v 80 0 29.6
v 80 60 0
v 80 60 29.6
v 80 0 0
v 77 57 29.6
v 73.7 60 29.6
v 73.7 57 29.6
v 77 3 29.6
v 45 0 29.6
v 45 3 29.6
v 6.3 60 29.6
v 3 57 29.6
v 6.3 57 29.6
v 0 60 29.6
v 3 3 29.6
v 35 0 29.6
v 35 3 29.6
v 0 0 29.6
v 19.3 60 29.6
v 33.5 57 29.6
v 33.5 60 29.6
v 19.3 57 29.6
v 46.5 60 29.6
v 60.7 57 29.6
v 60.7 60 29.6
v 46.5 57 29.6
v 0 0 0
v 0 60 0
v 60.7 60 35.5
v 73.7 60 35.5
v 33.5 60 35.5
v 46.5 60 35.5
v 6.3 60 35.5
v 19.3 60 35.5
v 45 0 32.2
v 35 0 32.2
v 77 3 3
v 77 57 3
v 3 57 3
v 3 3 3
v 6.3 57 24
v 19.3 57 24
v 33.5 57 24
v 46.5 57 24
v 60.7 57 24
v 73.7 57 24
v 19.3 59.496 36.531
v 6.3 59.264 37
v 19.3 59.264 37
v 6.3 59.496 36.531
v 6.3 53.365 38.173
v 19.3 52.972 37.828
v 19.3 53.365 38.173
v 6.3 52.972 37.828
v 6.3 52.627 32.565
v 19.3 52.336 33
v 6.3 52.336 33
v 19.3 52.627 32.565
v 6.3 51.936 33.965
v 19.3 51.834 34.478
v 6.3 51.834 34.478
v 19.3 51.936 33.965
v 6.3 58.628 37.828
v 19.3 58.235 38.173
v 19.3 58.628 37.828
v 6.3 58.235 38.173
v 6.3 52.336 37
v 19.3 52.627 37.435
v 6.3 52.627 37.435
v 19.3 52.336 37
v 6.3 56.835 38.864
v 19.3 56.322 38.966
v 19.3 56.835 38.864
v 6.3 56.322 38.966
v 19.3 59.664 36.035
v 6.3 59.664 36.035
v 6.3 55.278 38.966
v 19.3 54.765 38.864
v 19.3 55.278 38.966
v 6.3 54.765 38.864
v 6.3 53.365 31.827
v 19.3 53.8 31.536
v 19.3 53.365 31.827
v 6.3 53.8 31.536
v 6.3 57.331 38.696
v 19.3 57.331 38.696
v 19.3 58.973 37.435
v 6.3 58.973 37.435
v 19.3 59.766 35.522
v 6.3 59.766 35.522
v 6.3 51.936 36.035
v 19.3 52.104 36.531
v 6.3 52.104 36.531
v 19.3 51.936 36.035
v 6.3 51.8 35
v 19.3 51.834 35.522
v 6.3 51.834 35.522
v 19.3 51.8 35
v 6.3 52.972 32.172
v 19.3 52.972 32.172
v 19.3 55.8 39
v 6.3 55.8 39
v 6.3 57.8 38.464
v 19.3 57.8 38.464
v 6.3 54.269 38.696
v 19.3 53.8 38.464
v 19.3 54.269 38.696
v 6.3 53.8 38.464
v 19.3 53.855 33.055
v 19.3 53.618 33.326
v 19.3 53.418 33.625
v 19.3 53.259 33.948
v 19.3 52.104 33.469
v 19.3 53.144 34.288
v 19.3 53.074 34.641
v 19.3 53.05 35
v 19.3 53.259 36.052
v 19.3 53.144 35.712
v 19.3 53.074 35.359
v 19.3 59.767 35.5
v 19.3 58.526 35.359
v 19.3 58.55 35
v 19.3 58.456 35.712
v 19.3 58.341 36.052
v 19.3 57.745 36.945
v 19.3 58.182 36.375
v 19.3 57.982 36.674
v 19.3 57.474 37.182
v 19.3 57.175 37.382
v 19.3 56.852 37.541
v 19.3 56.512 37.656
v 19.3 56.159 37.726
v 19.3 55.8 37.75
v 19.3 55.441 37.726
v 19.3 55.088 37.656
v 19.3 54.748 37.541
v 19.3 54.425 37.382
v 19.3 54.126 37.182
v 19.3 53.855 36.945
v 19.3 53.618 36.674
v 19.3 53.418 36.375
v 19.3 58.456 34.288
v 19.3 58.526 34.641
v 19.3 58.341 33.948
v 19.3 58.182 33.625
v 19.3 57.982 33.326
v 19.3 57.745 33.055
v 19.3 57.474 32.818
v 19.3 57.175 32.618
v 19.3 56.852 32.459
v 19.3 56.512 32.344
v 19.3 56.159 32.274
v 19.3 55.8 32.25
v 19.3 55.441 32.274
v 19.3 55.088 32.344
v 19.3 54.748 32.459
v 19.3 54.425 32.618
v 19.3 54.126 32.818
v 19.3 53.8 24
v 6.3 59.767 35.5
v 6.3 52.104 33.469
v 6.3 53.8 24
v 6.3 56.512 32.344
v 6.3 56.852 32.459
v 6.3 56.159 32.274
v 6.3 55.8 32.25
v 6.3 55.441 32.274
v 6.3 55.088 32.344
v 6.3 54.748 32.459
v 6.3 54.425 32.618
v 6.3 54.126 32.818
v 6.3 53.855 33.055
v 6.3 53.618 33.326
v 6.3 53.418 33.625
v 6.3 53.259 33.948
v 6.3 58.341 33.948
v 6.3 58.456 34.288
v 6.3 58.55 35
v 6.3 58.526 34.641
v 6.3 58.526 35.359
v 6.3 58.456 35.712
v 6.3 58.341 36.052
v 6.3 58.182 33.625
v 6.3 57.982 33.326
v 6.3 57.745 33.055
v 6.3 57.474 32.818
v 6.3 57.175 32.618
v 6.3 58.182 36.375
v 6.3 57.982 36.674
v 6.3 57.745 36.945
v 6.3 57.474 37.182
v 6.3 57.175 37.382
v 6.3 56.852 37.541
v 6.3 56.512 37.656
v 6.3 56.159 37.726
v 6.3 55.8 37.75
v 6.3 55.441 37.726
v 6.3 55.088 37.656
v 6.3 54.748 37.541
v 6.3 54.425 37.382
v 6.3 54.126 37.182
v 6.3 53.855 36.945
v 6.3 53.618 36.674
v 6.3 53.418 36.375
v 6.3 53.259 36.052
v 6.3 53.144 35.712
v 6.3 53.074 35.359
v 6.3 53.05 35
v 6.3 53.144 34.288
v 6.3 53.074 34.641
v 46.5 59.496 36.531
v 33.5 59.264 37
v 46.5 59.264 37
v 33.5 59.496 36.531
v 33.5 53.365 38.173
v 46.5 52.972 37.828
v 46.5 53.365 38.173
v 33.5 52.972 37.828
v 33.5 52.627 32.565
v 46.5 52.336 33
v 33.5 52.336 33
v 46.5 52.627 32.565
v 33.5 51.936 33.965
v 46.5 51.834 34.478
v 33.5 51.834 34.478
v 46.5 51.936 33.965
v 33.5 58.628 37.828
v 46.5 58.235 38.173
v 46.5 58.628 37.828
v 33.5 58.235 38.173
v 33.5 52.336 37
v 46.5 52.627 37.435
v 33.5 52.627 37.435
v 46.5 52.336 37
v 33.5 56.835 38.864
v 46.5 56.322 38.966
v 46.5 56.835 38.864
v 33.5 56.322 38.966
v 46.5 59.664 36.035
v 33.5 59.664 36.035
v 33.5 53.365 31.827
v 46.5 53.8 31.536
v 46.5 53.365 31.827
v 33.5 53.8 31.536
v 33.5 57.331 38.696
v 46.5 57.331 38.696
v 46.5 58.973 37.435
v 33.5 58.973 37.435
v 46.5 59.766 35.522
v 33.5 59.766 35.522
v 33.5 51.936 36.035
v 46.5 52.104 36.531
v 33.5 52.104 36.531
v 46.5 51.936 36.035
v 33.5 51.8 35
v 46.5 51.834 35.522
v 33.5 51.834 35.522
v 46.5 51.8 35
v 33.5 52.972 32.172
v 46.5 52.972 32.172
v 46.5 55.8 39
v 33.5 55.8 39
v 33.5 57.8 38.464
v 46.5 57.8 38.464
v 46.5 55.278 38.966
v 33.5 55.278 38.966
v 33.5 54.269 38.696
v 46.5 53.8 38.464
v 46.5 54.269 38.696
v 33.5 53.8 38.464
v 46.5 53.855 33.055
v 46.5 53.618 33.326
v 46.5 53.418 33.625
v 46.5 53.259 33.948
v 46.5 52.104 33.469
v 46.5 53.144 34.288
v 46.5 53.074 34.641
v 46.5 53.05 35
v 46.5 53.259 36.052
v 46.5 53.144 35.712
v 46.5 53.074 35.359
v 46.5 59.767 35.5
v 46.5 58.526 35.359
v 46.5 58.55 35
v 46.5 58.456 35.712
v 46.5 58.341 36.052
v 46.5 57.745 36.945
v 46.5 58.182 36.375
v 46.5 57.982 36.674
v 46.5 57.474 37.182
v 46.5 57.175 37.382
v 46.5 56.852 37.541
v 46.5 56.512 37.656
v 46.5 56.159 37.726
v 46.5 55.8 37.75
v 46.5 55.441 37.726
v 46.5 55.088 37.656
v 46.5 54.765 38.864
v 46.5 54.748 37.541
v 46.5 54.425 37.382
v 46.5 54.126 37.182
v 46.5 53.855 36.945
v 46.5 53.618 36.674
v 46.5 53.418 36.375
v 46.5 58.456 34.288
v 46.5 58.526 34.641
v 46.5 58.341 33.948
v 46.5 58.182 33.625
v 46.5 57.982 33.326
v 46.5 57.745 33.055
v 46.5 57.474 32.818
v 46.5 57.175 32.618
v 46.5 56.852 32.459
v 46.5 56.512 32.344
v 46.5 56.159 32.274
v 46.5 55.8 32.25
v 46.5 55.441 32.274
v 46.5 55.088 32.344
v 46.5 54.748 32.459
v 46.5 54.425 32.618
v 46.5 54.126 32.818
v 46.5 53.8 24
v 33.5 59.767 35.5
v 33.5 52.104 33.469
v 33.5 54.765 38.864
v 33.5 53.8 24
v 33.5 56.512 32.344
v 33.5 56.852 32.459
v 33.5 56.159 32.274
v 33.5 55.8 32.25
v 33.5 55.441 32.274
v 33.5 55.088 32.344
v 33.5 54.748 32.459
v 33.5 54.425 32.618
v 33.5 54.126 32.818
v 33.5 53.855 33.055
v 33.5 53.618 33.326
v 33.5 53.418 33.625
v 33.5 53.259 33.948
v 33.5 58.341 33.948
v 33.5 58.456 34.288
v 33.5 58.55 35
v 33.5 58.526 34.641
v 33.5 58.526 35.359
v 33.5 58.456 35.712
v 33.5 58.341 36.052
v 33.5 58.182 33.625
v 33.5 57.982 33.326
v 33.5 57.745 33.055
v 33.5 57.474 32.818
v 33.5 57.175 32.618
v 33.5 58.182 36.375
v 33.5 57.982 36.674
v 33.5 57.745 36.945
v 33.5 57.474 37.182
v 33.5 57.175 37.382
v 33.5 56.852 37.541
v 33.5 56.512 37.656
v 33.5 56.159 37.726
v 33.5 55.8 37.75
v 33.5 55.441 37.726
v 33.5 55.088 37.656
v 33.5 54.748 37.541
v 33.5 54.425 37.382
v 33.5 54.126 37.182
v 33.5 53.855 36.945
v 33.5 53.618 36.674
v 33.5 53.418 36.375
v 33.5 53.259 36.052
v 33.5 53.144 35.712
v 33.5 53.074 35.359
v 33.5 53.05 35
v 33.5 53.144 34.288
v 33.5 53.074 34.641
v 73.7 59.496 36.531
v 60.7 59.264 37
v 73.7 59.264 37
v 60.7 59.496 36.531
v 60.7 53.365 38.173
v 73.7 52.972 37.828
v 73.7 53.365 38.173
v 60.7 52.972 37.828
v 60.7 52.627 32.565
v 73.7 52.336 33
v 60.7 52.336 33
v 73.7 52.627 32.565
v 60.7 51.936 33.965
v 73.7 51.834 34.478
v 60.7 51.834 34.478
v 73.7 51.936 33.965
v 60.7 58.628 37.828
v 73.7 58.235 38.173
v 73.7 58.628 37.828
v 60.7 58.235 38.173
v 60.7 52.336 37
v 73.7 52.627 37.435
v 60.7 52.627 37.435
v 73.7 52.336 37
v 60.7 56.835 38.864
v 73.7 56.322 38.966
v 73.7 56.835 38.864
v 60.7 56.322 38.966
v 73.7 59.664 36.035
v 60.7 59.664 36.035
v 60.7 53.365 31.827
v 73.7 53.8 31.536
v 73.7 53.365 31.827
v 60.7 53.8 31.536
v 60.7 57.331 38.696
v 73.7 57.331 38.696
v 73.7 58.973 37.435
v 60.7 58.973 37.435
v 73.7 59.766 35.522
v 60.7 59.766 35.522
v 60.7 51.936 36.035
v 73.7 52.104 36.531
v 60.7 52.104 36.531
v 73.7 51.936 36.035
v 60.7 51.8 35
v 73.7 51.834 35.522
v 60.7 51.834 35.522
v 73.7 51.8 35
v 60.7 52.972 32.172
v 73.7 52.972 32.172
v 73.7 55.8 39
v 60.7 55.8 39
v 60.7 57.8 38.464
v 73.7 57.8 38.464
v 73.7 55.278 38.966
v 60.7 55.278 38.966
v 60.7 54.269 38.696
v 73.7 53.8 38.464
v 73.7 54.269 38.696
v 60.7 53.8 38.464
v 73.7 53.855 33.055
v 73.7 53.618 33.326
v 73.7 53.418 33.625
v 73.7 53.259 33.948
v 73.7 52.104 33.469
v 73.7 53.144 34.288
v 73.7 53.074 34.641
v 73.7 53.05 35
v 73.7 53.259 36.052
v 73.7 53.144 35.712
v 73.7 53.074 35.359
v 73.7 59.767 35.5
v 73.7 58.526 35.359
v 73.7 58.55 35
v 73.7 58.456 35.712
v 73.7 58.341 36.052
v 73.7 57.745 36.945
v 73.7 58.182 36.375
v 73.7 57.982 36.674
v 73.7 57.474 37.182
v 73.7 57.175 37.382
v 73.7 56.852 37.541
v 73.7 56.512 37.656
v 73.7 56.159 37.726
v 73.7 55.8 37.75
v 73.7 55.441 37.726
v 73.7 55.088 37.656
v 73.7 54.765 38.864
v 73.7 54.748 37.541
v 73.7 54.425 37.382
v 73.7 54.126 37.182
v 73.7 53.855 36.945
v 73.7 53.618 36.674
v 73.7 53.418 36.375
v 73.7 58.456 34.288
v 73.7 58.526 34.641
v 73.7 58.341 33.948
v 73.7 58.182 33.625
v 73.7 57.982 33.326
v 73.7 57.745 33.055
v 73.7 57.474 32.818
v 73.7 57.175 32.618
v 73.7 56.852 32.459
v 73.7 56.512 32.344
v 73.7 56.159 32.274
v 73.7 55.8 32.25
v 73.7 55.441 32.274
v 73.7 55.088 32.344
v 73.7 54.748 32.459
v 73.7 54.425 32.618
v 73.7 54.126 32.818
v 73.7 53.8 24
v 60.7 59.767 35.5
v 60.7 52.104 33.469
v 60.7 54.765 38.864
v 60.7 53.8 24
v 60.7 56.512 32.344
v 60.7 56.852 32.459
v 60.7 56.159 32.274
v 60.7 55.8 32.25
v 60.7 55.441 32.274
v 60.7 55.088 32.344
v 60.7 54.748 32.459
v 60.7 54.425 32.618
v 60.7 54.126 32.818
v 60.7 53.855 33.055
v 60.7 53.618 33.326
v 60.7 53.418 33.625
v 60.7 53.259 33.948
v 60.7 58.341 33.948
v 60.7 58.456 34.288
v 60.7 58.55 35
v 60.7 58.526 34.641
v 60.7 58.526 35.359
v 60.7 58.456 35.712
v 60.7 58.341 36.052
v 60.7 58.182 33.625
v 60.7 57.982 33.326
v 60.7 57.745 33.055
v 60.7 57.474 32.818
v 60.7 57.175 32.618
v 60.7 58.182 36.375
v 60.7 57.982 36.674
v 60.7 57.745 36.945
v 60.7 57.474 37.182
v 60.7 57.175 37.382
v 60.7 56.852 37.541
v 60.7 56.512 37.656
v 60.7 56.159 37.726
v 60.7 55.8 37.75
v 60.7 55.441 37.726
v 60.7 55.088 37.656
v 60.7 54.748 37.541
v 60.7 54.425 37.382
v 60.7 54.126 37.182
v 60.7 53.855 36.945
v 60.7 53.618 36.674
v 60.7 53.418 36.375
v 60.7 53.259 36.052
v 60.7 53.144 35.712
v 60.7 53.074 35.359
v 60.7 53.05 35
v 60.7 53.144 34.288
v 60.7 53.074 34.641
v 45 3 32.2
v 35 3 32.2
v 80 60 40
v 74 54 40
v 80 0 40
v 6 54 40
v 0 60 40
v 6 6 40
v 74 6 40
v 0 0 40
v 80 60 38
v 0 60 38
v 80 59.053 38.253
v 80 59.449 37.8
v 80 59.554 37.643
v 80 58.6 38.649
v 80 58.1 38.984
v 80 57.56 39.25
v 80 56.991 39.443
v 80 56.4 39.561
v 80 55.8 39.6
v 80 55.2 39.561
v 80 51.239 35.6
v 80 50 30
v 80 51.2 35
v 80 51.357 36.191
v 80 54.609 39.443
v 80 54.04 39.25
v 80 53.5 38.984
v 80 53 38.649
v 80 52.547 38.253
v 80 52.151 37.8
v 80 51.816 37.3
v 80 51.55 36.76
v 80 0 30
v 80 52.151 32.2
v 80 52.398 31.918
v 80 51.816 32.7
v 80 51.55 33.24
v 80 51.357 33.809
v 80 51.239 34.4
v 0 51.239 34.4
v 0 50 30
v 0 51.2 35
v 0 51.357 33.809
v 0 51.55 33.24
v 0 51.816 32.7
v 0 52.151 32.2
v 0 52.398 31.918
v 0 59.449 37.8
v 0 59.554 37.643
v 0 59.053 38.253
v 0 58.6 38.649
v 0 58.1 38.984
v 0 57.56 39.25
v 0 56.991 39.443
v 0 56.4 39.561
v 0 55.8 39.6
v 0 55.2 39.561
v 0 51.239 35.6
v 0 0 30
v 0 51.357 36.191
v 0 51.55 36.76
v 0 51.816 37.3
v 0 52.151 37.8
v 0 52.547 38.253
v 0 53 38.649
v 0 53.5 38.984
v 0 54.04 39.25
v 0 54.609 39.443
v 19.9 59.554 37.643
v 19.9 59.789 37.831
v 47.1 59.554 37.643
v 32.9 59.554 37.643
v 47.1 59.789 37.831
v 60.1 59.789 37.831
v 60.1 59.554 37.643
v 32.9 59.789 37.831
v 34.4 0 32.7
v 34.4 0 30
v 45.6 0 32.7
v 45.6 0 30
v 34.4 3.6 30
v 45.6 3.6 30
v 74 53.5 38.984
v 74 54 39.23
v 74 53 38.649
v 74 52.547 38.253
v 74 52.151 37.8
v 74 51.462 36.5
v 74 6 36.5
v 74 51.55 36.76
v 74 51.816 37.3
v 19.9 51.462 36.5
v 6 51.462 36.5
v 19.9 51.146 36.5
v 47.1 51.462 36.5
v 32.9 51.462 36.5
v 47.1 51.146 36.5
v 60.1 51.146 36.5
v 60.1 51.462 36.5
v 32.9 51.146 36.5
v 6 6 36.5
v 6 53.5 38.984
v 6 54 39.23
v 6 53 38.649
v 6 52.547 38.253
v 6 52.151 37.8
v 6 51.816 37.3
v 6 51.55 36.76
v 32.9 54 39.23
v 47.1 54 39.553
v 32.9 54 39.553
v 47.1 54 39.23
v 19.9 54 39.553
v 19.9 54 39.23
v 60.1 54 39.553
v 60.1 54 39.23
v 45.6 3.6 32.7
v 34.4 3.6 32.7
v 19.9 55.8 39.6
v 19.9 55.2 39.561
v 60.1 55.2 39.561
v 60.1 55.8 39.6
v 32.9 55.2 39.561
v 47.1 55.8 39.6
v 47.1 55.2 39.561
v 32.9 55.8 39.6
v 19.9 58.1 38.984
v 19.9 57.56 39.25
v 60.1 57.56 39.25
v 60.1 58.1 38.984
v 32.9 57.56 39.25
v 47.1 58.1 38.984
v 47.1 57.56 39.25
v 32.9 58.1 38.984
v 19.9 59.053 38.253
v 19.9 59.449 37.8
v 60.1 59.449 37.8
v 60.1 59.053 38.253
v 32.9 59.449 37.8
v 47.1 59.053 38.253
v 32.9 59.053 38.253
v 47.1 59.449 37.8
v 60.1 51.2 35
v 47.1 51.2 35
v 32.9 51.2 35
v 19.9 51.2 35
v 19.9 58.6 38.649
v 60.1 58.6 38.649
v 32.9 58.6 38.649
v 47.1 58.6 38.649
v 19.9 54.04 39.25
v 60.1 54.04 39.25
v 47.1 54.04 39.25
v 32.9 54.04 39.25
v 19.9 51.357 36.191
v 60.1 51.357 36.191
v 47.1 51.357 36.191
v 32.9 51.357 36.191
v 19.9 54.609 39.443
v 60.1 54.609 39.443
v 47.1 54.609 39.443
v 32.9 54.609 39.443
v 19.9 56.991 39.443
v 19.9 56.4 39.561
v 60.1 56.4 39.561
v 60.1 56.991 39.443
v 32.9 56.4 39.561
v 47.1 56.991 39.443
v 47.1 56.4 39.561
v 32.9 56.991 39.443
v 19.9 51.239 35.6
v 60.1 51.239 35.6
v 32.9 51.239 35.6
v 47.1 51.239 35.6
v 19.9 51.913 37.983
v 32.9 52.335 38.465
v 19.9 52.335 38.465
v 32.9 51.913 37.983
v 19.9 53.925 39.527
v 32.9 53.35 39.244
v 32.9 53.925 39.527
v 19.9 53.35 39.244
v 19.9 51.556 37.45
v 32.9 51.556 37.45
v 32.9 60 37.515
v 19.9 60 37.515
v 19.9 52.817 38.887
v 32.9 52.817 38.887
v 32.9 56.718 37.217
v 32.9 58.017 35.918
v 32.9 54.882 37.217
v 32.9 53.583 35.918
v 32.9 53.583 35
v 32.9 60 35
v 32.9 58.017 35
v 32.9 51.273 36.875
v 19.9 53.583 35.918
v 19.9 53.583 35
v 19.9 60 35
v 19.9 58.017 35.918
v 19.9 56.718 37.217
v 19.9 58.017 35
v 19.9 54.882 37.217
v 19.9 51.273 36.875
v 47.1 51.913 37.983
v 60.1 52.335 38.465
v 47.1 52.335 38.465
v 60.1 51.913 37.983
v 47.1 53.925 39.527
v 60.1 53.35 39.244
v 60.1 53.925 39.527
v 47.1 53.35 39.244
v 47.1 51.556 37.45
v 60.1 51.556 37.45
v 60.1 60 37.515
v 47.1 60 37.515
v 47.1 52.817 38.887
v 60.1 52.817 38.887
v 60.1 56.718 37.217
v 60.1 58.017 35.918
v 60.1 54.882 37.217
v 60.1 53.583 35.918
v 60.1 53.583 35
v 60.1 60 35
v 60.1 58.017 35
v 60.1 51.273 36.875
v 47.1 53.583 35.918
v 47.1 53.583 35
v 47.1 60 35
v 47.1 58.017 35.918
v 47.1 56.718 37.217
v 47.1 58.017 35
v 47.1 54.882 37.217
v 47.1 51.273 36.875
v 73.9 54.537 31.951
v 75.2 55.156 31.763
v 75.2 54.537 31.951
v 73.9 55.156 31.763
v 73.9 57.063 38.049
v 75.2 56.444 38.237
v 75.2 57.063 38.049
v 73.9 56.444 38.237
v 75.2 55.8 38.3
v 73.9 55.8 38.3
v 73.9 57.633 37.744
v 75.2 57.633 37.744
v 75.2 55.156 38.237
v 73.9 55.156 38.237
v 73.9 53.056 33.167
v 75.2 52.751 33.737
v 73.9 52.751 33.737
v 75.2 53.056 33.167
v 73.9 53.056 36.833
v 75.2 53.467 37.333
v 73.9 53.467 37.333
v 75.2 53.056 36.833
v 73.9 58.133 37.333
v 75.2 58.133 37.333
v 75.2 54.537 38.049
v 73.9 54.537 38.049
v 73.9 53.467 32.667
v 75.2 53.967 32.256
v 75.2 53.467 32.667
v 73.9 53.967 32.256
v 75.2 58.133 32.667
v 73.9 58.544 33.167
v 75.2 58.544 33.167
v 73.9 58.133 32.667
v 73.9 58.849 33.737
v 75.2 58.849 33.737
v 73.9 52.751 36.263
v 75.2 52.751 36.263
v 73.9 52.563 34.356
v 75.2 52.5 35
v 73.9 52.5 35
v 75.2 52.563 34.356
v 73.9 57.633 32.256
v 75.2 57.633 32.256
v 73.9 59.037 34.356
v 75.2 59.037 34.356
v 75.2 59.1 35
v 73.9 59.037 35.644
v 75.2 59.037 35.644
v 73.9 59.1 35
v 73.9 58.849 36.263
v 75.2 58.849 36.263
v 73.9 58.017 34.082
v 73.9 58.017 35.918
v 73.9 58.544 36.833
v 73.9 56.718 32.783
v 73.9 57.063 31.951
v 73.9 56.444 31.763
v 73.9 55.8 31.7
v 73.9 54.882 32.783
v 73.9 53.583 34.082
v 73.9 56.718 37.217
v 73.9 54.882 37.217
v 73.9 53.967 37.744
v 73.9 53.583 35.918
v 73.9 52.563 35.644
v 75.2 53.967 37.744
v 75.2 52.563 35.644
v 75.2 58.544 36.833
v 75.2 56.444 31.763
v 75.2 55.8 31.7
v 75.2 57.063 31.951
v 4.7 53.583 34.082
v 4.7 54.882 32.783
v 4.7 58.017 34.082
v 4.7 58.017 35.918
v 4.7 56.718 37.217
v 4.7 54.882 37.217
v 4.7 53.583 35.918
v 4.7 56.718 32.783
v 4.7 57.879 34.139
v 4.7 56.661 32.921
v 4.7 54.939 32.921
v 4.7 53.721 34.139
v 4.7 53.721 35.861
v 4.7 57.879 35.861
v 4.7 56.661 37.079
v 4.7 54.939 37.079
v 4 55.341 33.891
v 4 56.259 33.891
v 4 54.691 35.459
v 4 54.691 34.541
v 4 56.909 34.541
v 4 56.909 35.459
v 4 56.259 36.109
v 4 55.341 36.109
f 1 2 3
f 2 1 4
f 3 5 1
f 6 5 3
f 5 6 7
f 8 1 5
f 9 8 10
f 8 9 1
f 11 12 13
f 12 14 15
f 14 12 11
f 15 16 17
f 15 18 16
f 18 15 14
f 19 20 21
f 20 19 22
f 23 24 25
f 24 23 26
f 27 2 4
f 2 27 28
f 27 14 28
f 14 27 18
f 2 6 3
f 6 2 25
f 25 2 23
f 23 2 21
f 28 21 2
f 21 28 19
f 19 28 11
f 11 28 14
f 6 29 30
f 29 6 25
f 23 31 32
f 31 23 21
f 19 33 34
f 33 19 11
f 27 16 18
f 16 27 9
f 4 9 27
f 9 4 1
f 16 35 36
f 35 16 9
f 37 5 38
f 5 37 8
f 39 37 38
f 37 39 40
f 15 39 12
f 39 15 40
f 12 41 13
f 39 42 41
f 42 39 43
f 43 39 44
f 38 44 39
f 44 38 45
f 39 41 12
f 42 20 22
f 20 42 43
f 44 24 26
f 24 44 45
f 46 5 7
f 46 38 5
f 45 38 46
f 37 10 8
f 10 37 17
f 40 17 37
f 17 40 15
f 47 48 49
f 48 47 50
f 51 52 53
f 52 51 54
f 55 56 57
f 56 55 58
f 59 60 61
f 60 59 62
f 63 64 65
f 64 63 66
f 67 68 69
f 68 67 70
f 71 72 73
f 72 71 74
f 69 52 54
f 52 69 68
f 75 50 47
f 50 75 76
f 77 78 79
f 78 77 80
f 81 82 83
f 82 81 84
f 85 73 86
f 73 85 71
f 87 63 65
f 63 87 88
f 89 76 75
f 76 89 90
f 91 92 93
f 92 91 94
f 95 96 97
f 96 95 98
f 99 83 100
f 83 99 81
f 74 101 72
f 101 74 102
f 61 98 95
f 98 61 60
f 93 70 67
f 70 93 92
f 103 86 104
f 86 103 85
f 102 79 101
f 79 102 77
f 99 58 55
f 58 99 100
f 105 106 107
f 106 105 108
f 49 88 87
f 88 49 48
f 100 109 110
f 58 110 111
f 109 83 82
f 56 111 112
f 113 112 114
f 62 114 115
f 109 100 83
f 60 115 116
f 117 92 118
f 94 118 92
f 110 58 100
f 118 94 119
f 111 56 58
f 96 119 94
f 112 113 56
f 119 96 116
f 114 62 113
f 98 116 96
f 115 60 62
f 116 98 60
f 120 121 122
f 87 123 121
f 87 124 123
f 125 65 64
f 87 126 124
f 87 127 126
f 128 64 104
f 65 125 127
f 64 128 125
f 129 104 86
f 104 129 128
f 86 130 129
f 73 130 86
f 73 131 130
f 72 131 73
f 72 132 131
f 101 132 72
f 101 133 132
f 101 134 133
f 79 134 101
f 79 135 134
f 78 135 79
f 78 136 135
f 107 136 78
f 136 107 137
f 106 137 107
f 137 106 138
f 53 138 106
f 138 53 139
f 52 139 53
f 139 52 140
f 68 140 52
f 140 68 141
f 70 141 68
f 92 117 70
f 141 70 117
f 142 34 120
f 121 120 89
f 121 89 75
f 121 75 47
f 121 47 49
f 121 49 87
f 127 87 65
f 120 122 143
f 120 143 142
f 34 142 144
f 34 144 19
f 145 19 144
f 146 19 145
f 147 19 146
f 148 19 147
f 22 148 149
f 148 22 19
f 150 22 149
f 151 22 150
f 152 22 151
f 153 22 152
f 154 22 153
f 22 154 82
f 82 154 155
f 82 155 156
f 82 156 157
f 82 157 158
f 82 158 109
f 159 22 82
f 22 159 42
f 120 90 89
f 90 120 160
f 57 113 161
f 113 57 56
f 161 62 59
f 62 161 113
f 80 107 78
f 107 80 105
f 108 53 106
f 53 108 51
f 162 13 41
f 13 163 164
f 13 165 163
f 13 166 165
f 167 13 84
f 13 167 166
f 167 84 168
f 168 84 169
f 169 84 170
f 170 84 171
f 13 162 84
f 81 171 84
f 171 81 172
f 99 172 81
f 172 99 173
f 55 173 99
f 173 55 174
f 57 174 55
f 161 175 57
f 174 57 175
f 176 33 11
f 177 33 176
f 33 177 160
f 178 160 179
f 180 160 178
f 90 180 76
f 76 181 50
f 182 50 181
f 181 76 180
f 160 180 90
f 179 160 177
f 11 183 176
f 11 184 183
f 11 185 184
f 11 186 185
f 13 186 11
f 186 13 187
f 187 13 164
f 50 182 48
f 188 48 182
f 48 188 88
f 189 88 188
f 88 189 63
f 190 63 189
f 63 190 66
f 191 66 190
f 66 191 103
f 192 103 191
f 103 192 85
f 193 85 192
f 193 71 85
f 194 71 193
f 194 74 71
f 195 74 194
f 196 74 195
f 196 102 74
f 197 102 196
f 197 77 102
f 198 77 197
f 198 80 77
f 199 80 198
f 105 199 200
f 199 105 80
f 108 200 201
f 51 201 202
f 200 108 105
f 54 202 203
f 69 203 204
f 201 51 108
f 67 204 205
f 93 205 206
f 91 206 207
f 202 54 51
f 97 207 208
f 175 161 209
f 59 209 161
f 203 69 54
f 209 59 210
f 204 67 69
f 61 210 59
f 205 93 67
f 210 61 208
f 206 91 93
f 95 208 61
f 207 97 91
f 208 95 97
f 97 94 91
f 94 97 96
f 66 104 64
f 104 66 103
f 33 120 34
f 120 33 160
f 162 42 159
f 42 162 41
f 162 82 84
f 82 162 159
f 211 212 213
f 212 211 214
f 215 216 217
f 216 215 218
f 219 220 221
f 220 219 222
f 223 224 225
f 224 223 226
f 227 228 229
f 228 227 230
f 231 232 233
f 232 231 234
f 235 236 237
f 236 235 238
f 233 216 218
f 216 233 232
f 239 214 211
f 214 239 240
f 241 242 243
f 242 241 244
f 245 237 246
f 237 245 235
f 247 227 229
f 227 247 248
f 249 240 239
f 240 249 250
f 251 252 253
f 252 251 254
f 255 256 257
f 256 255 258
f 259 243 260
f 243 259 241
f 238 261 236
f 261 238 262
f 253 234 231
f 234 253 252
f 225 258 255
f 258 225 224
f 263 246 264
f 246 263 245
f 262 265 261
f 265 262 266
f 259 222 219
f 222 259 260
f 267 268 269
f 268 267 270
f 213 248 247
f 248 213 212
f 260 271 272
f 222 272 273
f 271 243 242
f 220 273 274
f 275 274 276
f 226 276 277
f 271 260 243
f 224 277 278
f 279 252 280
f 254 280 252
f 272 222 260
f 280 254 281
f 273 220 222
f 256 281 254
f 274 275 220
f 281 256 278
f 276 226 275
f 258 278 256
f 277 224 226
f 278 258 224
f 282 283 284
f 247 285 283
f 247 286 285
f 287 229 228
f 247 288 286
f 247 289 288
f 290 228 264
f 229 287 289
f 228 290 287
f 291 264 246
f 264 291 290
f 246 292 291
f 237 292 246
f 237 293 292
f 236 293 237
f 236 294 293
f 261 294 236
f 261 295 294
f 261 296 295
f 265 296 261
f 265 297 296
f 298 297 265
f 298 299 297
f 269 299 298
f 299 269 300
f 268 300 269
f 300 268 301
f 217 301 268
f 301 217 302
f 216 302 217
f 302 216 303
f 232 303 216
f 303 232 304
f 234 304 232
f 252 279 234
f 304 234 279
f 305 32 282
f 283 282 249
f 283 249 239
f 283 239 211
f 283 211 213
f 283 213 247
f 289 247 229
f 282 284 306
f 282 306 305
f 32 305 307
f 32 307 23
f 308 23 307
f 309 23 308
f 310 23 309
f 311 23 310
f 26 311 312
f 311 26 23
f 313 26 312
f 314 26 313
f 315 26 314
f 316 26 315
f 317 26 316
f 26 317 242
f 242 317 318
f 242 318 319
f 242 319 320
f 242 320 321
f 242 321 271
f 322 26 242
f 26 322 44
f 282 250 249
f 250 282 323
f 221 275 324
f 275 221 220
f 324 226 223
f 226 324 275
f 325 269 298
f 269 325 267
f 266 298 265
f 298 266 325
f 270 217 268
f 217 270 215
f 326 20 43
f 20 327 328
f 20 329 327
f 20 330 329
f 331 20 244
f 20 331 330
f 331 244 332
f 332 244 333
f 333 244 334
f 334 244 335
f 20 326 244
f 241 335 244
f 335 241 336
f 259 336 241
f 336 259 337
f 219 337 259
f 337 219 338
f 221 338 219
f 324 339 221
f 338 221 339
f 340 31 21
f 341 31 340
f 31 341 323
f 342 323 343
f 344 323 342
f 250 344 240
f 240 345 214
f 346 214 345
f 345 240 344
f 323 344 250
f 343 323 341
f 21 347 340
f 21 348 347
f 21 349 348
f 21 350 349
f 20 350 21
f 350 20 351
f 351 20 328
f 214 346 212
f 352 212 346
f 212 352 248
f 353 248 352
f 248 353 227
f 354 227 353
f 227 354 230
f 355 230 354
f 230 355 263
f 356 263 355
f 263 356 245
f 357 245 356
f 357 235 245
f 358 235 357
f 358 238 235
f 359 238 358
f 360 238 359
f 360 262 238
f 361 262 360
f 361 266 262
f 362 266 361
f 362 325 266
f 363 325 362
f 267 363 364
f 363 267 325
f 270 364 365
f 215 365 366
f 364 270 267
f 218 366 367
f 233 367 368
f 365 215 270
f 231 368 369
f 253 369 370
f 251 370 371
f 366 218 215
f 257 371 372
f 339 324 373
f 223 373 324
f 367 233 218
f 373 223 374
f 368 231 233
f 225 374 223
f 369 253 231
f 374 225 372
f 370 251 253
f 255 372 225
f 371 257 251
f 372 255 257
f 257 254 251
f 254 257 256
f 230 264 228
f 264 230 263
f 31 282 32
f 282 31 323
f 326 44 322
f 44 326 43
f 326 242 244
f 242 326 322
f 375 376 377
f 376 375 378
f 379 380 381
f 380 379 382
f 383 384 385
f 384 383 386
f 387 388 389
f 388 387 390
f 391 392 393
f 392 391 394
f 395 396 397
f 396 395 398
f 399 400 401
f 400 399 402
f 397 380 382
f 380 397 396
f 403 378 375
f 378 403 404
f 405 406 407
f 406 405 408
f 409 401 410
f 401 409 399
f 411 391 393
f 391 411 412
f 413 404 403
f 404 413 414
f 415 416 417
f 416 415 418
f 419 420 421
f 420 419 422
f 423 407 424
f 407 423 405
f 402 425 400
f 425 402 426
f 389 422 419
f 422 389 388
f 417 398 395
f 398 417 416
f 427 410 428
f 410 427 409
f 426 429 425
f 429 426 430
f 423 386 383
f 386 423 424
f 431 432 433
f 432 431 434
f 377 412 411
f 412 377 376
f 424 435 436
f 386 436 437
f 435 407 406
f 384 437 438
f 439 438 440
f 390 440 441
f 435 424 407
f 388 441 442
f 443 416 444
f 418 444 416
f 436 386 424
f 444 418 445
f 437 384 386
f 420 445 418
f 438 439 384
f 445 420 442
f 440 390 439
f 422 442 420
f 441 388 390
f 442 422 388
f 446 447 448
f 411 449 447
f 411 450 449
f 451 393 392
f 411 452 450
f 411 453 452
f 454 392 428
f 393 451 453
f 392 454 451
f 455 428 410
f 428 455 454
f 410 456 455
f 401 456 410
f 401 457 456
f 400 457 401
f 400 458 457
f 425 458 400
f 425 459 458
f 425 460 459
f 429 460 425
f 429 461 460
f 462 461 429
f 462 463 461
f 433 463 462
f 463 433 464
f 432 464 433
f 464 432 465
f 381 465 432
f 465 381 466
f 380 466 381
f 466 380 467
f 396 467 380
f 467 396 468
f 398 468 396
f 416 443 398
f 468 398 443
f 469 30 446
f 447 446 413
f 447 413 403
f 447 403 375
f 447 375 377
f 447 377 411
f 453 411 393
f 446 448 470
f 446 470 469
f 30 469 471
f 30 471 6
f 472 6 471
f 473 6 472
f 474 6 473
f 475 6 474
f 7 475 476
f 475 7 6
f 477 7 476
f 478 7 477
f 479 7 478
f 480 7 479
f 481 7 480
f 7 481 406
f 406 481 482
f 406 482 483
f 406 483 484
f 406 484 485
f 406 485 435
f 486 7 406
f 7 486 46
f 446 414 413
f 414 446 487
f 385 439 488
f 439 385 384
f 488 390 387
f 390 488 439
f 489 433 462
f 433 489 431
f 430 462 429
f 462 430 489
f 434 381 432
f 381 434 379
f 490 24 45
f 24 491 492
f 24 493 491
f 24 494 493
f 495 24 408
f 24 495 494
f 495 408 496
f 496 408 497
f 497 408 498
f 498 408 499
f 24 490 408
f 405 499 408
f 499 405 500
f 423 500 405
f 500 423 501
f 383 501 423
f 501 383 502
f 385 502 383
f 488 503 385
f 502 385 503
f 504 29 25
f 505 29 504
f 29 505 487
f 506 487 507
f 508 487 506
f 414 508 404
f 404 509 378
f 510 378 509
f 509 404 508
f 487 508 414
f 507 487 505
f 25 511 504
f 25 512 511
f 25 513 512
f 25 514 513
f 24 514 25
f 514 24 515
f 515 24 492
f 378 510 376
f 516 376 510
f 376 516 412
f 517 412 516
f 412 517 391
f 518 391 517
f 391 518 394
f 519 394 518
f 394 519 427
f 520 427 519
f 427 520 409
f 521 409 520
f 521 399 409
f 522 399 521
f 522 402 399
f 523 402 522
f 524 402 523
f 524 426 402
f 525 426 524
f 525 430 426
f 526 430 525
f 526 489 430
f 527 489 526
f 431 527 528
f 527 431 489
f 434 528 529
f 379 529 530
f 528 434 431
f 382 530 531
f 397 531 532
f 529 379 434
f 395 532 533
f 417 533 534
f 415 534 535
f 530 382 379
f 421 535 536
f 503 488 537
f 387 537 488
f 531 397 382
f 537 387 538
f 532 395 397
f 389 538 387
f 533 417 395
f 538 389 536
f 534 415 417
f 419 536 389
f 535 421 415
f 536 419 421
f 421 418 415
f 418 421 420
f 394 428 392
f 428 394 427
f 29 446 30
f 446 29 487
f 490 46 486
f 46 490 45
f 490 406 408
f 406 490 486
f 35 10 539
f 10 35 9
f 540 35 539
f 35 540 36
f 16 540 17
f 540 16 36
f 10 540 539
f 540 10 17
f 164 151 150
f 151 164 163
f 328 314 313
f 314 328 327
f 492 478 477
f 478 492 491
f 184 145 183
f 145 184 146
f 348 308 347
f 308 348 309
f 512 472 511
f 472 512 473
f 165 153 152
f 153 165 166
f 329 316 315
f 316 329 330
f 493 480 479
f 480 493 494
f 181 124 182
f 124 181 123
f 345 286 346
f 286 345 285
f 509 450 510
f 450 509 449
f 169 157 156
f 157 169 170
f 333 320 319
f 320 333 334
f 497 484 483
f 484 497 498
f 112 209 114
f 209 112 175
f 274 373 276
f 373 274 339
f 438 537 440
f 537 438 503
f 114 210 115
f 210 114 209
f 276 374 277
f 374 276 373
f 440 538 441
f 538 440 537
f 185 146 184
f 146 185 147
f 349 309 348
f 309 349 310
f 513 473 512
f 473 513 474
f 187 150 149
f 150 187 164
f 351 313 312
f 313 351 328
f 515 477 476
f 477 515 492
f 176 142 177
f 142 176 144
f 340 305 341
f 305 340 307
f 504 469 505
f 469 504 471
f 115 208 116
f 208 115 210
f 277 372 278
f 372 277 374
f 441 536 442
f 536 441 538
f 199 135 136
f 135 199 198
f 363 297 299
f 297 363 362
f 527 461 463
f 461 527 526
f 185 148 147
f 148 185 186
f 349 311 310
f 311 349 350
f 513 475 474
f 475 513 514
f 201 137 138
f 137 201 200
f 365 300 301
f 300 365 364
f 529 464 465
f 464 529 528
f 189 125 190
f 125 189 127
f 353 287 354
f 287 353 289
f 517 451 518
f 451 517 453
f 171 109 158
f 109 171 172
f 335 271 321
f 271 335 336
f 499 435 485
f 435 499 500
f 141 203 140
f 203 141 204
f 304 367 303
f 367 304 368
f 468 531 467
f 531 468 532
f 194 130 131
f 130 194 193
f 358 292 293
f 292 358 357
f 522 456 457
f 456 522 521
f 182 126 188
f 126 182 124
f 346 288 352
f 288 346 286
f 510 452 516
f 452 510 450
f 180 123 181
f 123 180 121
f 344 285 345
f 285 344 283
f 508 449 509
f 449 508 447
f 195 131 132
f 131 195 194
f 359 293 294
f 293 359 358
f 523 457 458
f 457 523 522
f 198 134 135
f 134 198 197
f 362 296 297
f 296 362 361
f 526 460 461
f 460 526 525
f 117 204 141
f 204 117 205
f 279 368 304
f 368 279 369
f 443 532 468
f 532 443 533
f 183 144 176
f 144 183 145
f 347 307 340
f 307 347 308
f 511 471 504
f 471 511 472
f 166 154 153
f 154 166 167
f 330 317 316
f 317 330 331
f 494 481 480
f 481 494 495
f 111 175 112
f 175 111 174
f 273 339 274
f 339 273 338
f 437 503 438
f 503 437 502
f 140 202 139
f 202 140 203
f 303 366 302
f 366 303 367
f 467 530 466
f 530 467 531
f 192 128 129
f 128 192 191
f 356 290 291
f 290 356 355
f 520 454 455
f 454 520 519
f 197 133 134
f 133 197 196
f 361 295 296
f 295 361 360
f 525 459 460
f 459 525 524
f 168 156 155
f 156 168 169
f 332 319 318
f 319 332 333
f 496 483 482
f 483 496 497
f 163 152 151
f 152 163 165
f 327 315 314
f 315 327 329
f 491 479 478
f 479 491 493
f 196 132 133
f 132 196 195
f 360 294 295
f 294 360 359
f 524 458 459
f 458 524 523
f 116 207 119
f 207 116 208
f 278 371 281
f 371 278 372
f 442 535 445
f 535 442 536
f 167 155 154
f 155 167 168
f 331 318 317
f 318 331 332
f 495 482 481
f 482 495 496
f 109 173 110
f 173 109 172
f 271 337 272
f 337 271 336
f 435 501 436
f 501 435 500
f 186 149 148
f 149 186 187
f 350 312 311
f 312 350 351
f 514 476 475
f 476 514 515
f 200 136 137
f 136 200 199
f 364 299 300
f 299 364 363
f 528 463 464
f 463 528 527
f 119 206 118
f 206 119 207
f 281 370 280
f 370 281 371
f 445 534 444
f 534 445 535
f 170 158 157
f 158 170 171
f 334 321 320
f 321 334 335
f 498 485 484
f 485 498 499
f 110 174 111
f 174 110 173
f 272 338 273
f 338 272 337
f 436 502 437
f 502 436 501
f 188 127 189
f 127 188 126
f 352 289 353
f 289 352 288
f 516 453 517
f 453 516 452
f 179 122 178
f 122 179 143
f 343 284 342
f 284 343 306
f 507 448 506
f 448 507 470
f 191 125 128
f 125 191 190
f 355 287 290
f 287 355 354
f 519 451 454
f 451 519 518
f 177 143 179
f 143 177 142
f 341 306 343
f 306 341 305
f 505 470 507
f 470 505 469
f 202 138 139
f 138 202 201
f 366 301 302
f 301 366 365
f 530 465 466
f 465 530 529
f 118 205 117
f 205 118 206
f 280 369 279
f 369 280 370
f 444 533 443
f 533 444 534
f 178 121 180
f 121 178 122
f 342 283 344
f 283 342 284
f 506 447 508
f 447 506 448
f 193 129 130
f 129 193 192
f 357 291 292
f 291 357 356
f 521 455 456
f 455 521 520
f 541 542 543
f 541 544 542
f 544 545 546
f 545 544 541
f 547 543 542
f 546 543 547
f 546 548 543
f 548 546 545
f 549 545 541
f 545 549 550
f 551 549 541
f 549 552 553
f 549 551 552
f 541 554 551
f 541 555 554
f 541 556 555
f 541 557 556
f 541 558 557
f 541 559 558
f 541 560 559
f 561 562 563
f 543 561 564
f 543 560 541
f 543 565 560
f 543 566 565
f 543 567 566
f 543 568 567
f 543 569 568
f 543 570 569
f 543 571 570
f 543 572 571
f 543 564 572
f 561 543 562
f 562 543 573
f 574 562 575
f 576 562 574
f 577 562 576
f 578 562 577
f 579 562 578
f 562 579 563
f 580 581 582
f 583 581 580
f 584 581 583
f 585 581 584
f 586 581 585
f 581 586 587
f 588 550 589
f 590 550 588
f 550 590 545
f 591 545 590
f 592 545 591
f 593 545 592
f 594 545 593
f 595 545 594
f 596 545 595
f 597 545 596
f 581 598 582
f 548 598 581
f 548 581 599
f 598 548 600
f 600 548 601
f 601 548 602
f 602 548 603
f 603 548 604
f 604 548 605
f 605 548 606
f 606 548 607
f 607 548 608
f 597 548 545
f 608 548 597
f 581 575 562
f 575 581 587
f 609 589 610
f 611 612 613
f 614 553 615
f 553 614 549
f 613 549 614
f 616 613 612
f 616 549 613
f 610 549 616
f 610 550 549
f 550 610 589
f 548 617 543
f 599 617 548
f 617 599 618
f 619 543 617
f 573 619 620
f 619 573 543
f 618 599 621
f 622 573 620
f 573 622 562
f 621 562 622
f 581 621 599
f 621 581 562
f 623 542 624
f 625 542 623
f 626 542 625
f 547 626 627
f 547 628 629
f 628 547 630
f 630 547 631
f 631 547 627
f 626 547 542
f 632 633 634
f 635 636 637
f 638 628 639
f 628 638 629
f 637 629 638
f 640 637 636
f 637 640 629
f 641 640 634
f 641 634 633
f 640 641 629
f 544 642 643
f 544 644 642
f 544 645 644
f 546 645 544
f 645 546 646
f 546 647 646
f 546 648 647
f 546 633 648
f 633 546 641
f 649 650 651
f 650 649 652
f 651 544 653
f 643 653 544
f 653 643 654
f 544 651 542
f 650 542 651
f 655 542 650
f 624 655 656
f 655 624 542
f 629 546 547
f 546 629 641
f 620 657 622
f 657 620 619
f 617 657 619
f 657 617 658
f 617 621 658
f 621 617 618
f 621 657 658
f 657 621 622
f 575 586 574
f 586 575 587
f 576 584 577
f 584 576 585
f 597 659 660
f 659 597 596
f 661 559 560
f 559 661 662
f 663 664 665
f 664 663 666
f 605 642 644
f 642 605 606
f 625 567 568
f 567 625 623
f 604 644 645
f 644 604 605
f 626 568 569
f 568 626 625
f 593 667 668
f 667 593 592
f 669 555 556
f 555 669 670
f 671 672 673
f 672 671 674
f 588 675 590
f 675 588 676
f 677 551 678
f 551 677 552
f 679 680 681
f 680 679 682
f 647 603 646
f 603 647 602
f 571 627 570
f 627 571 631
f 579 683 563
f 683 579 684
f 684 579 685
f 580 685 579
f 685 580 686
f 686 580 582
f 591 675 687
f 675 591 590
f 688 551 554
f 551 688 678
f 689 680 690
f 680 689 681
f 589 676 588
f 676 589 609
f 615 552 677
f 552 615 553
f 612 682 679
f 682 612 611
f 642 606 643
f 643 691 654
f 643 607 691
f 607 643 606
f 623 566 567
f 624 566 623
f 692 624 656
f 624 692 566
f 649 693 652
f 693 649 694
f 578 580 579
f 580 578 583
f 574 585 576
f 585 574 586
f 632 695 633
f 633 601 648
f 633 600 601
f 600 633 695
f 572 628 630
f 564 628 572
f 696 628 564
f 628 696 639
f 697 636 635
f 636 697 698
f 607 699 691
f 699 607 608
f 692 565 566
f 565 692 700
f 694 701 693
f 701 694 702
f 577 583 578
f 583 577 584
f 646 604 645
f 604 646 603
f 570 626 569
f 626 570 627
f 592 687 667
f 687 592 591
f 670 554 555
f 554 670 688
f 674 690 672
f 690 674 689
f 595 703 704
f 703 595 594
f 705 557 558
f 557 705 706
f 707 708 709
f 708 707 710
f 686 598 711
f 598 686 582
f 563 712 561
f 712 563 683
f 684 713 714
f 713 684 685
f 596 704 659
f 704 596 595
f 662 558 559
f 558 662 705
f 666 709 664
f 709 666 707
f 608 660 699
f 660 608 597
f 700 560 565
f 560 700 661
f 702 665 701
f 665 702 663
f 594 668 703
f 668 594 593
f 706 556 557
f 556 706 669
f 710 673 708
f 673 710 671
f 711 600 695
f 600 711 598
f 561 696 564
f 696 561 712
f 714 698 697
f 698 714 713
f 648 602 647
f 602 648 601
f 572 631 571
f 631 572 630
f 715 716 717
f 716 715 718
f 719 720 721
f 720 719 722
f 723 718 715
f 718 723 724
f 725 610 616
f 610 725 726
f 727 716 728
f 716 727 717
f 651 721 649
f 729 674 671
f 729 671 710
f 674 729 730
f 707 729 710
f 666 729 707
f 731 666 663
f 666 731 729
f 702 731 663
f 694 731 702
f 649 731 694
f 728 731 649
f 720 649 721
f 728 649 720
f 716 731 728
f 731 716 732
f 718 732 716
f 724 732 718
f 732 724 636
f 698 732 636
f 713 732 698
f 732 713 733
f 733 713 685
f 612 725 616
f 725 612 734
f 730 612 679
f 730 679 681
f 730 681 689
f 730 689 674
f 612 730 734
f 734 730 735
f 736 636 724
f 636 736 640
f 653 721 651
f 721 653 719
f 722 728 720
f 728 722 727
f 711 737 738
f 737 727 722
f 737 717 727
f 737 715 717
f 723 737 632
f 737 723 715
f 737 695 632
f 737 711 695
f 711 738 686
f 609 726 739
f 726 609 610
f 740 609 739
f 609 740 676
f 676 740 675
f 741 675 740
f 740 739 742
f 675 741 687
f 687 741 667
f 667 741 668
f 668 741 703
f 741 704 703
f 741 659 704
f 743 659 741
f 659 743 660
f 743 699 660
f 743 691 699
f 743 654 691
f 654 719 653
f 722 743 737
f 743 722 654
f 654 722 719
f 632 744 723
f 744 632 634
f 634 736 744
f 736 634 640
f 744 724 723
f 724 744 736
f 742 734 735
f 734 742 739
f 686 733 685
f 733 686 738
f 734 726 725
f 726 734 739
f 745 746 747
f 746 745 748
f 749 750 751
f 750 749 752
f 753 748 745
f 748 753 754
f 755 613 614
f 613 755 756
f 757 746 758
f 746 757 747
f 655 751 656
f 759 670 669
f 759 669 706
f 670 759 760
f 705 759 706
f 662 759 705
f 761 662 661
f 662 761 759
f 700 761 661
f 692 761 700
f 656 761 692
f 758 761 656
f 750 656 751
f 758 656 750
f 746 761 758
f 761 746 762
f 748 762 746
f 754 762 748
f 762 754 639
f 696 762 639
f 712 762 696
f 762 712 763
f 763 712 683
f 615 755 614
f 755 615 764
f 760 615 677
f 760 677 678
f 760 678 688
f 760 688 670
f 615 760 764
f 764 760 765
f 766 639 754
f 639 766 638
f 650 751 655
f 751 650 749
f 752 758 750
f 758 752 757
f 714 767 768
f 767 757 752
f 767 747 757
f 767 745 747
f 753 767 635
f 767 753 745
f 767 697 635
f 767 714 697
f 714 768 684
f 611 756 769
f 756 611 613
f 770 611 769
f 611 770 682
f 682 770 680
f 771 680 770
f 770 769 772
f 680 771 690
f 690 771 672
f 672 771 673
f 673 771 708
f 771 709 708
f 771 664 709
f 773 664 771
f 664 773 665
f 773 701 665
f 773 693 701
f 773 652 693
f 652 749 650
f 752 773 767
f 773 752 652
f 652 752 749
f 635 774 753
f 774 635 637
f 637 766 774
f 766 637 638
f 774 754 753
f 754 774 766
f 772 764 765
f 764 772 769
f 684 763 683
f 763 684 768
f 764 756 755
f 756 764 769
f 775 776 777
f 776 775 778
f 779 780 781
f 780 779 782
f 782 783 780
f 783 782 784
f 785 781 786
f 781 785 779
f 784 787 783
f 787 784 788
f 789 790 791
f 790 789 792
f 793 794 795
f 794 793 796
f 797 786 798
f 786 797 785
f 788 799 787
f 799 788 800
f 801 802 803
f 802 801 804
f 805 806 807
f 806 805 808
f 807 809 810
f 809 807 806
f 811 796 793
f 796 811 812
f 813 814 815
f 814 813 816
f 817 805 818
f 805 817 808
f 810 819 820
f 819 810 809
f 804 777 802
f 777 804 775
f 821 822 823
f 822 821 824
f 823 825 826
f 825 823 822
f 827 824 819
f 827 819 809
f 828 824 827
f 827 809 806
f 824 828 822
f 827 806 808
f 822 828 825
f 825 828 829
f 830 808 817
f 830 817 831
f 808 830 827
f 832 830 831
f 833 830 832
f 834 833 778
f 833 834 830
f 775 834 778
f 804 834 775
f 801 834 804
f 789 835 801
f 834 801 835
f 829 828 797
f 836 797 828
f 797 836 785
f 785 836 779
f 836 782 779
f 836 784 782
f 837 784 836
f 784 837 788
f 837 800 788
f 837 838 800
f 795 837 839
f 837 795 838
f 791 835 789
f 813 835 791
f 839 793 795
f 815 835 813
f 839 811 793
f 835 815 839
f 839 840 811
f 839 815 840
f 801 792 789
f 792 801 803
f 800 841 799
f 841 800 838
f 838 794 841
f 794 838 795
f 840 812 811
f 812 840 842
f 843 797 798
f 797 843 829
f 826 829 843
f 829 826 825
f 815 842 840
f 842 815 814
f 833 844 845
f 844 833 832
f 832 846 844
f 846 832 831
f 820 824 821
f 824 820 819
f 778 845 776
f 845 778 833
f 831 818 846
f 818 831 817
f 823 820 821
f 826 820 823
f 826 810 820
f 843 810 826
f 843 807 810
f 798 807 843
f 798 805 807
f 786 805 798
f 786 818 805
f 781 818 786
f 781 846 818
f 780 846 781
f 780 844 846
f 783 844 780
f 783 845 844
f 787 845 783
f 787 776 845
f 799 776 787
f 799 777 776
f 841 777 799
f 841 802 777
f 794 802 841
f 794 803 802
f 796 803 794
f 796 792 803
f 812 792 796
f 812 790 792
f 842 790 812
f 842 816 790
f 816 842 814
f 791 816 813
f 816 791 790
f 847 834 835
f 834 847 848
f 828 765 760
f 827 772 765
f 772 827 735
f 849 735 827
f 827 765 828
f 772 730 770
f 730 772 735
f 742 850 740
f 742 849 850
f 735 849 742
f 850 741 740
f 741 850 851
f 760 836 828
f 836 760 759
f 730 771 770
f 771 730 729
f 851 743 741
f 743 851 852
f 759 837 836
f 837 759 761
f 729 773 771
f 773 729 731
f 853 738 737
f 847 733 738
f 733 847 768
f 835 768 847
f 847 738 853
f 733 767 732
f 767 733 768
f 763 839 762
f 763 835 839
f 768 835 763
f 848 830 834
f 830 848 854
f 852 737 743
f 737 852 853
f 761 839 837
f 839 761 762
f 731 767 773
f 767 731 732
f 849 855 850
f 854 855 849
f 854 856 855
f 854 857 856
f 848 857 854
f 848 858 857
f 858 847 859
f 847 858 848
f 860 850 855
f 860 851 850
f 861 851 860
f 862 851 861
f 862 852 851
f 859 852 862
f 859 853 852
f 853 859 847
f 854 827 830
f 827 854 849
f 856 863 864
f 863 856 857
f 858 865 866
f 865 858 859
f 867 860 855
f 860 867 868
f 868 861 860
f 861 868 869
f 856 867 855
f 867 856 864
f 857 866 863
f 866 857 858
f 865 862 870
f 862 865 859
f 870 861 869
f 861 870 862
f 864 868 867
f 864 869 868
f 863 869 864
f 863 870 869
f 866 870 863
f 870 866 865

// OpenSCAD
// Print-in-place hinged box, 80 x 60 x 40 mm closed.
// Printed closed in PLA (Bambu A1, 0.4 nozzle): base, lid and a captive
// hinge pin are separate bodies with 0.35-0.6 mm clearances, so the hinge
// breaks free by hand.  No supports: the lid underside bridges the cavity,
// the hinge barrels/pin use faceted (octagonal) lower surfaces, and all
// other downward faces are short bridges or rest on the body below.

/* [Part] */
part = "assembly"; // [assembly, box, lid, pin]

/* [Dimensions] */
box_w = 80;          // X, outside
box_d = 60;          // Y, outside (front y=0, back y=60)
box_h = 29.6;        // base height to its rim
lid_h = 10;          // lid height; lid bottom at z=30 (0.4 gap)
lid_z = 30;
wall = 3;
floor_t = 3;
total_h = 40;

hinge_y = 55.8;      // hinge axis, assembly coords
hinge_z = 35;
barrel_r = 4.0;
pin_r = 2.4;         // octagon circumradius
bore_r = 2.75;       // pin_r + 0.35 radial clearance
relief_r = 4.6;      // barrel_r + 0.6

// Alternating knuckles along the back edge (x intervals), 0.6 mm end gaps.
box_segs  = [[6.3, 19.3], [33.5, 46.5], [60.7, 73.7]];
lid_segs  = [[19.9, 32.9], [47.1, 60.1]];

cadverify_only = "";
module instance(name, part_name, unit = 1) {
    echo(cadverify_instance = [name, part_name, unit]);
    if (cadverify_only == "" || cadverify_only == name) children();
}

// ---------------------------------------------------------------- base (box)
module box_main() {
    difference() {
        union() {
            // shell: outer block minus open-top cavity
            difference() {
                cube([box_w, box_d, box_h]);
                translate([wall, wall, floor_t]) cube([box_w - 2 * wall, box_d - 2 * wall, box_h]);
            }
            // hinge knuckles (base) + support posts down to the back wall
            for (s = box_segs) {
                translate([s[0], hinge_y, hinge_z]) rotate([0, 90, 0])
                    cylinder(h = s[1] - s[0], r = barrel_r, $fn = 48);
                translate([s[0], 53.8, 24]) cube([s[1] - s[0], 6.2, 11.5]);
            }
            // front catch tooth (enters the socket in the lid)
            translate([35, 0, box_h]) cube([10, wall, 2.6]);
        }
        // pin bore through the base knuckles
        translate([-1, hinge_y, hinge_z]) rotate([0, 90, 0])
            cylinder(h = box_w + 2, r = bore_r, $fn = 48);
    }
}

// ---------------------------------------------------------------- lid (local: z 0..10, hinge axis at z=5)
module lid_main() {
    union() {
        difference() {
            union() {
                // main slab, side profile (Y-Z) extruded along X.
                // Rear lower edge chamfered 50,0 -> 60,8 so the slab
                // swings clear of the base back wall.
                rotate([0, 90, 0])
                    linear_extrude(height = box_w)
                        polygon(points = [[0, 0], [0, 50], [-8, 60], [-10, 60], [-10, 0]]);
                // hinge knuckles (lid)
                for (s = lid_segs)
                    translate([s[0], hinge_y, 5]) rotate([0, 90, 0])
                        cylinder(h = s[1] - s[0], r = barrel_r, $fn = 48);
            }
            // recessed panel in the top face
            translate([6, 6, 6.5]) cube([68, 48, 4]);
            // front catch socket (tooth: x35..45, z assy 29.6..32.2)
            translate([34.4, -1, -0.5]) cube([11.2, 4.6, 3.2]);
            // clearance tunnel for the base knuckles / pin
            translate([-1, hinge_y, 5]) rotate([0, 90, 0])
                cylinder(h = box_w + 2, r = relief_r, $fn = 48);
            // pin bore through the lid knuckles
            translate([-1, hinge_y, 5]) rotate([0, 90, 0])
                cylinder(h = box_w + 2, r = bore_r, $fn = 48);
        }
        // webs joining lid knuckles to the slab: upper half-discs r=4.9
        // (stay above z=30.1 in assembly, clear of the base rim at 29.6)
        for (s = lid_segs)
            intersection() {
                translate([s[0], hinge_y, 5]) rotate([0, 90, 0])
                    cylinder(h = s[1] - s[0], r = 4.9, $fn = 48);
                translate([s[0], hinge_y - 10, 5]) cube([s[1] - s[0], 20, 5]);
                translate([s[0], 0, 0]) cube([s[1] - s[0], box_d, lid_h]);
            }
    }
}

// ---------------------------------------------------------------- pin
// Centred on its axis, local +Z from head (z=0) to tip (z=71.2).
module pin_geom() {
    union() {
        cylinder(h = 1.3, r = 3.3, $fn = 32);                    // head
        translate([0, 0, 1.0]) rotate([0, 0, 22.5])
            cylinder(h = 69.5, r = pin_r, $fn = 8);              // octagonal shaft
        translate([0, 0, 70.4]) rotate([0, 0, 22.5])
            cylinder(h = 0.8, r1 = pin_r, r2 = 1.2, $fn = 8);    // lead-in tip
    }
}
module pin_part() { translate([3.3, 3.3, 0]) pin_geom(); }

// ---------------------------------------------------------------- output
if (part == "box") {
    echo(cadverify_spec = [
        ["bounds", [[0, 0, 0], [box_w, box_d, hinge_z + barrel_r]]],
        ["bodies", 1],
        ["copies", 1],
        ["support_faces", [["bed", "-z", 4000]]],
        ["overhangs_allowed", [["hinge knuckles and pin bore print in place; faceted bore ceiling is a short internal bridge", [[5, 51, 30], [75, 60, 39.5]]]]],
        ["details", [
            ["cavity", "void", [[4, 4, 10], [76, 53, 29]], 0.95],
            ["front_wall", "thickness", [40, -1, 15], [0, 1, 0], 3],
            ["floor", "thickness", [40, 30, -1], [0, 0, 1], 3],
            ["box_knuckle", "material", [[7, 52, 33.5], [18, 53.8, 36.5]], 0.6],
            ["pin_bore", "void", [[8, 54.9, 34.1], [17, 56.7, 35.9]], 0.9],
            ["catch_tooth", "material", [[36, 0.5, 30], [44, 2.5, 32]], 0.85],
            ["hinge_knuckles", "view", [[4, 50, 28], [76, 60, 39.5]]]
        ]]
    ]);
    box_main();
} else if (part == "lid") {
    echo(cadverify_spec = [
        ["bounds", [[0, 0, 0], [box_w, box_d, lid_h]]],
        ["bodies", 1],
        ["copies", 1],
        ["support_faces", [["print_face", "-z", 3000]]],
        ["overhangs_allowed", [["lid knuckle bores print in place around the pin; bore ceilings are short internal bridges", [[5, 51, 0], [75, 60, 10]]]]],
        ["details", [
            ["top_pocket", "void", [[7, 7, 6.6], [73, 53, 9.9]], 0.95],
            ["lid_slab", "thickness", [40, 30, 9], [0, 0, -1], 6.5],
            ["lid_knuckle", "material", [[21, 52, 3.5], [32, 53.8, 6.5]], 0.45],
            ["pin_bore", "void", [[22, 55.4, 4.6], [31, 56.2, 5.4]], 0.45],
            ["catch_socket", "void", [[35, 0.5, 0.2], [45, 2.5, 2.5]], 0.9],
            ["hinge_knuckles", "view", [[4, 50, 0], [76, 60, 10]]]
        ]]
    ]);
    lid_main();
} else if (part == "pin") {
    echo(cadverify_spec = [
        ["bounds", [[0, 0, 0], [6.6, 6.6, 71.2]]],
        ["bodies", 1],
        ["copies", 1],
        ["support_faces", [["head_base", "-z", 30]]],
        ["overhangs_allowed", []],
        ["details", [
            ["pin_shaft", "material", [[2, 2, 10], [4.6, 4.6, 20]], 0.9],
            ["pin_head", "material", [[1, 1, 0.1], [5.6, 5.6, 1.2]], 0.75],
            ["pin_length", "thickness", [1.2, 3.3, 72], [0, 0, -1], 71.2],
            ["pin_head_view", "view", [[0, 0, 0], [6.6, 6.6, 2]]]
        ]]
    ]);
    pin_part();
} else if (part == "assembly") {
    echo(cadverify_spec = [
        ["bounds", [[0, 0, 0], [box_w, box_d, total_h]]],
        ["support_faces", [["bed", "-z", 4000]]],
        ["allowed_interferences", []],
        ["motions", [
            ["lid_swing", ["lid"], "rotate", [0, hinge_y, hinge_z], [-1, 0, 0], [0, 110]]
        ]],
        ["assembly_order", [
            [["base"], [0, 0, 0]],
            [["lid"], [0, 0, -1]],
            [["pin"], [-1, 0, 0]]
        ]]
    ]);
    instance("base", "box") box_main();
    instance("lid", "lid") translate([0, 0, lid_z]) lid_main();
    instance("pin", "pin") translate([75.2, hinge_y, hinge_z]) rotate([0, -90, 0]) pin_geom();
}
